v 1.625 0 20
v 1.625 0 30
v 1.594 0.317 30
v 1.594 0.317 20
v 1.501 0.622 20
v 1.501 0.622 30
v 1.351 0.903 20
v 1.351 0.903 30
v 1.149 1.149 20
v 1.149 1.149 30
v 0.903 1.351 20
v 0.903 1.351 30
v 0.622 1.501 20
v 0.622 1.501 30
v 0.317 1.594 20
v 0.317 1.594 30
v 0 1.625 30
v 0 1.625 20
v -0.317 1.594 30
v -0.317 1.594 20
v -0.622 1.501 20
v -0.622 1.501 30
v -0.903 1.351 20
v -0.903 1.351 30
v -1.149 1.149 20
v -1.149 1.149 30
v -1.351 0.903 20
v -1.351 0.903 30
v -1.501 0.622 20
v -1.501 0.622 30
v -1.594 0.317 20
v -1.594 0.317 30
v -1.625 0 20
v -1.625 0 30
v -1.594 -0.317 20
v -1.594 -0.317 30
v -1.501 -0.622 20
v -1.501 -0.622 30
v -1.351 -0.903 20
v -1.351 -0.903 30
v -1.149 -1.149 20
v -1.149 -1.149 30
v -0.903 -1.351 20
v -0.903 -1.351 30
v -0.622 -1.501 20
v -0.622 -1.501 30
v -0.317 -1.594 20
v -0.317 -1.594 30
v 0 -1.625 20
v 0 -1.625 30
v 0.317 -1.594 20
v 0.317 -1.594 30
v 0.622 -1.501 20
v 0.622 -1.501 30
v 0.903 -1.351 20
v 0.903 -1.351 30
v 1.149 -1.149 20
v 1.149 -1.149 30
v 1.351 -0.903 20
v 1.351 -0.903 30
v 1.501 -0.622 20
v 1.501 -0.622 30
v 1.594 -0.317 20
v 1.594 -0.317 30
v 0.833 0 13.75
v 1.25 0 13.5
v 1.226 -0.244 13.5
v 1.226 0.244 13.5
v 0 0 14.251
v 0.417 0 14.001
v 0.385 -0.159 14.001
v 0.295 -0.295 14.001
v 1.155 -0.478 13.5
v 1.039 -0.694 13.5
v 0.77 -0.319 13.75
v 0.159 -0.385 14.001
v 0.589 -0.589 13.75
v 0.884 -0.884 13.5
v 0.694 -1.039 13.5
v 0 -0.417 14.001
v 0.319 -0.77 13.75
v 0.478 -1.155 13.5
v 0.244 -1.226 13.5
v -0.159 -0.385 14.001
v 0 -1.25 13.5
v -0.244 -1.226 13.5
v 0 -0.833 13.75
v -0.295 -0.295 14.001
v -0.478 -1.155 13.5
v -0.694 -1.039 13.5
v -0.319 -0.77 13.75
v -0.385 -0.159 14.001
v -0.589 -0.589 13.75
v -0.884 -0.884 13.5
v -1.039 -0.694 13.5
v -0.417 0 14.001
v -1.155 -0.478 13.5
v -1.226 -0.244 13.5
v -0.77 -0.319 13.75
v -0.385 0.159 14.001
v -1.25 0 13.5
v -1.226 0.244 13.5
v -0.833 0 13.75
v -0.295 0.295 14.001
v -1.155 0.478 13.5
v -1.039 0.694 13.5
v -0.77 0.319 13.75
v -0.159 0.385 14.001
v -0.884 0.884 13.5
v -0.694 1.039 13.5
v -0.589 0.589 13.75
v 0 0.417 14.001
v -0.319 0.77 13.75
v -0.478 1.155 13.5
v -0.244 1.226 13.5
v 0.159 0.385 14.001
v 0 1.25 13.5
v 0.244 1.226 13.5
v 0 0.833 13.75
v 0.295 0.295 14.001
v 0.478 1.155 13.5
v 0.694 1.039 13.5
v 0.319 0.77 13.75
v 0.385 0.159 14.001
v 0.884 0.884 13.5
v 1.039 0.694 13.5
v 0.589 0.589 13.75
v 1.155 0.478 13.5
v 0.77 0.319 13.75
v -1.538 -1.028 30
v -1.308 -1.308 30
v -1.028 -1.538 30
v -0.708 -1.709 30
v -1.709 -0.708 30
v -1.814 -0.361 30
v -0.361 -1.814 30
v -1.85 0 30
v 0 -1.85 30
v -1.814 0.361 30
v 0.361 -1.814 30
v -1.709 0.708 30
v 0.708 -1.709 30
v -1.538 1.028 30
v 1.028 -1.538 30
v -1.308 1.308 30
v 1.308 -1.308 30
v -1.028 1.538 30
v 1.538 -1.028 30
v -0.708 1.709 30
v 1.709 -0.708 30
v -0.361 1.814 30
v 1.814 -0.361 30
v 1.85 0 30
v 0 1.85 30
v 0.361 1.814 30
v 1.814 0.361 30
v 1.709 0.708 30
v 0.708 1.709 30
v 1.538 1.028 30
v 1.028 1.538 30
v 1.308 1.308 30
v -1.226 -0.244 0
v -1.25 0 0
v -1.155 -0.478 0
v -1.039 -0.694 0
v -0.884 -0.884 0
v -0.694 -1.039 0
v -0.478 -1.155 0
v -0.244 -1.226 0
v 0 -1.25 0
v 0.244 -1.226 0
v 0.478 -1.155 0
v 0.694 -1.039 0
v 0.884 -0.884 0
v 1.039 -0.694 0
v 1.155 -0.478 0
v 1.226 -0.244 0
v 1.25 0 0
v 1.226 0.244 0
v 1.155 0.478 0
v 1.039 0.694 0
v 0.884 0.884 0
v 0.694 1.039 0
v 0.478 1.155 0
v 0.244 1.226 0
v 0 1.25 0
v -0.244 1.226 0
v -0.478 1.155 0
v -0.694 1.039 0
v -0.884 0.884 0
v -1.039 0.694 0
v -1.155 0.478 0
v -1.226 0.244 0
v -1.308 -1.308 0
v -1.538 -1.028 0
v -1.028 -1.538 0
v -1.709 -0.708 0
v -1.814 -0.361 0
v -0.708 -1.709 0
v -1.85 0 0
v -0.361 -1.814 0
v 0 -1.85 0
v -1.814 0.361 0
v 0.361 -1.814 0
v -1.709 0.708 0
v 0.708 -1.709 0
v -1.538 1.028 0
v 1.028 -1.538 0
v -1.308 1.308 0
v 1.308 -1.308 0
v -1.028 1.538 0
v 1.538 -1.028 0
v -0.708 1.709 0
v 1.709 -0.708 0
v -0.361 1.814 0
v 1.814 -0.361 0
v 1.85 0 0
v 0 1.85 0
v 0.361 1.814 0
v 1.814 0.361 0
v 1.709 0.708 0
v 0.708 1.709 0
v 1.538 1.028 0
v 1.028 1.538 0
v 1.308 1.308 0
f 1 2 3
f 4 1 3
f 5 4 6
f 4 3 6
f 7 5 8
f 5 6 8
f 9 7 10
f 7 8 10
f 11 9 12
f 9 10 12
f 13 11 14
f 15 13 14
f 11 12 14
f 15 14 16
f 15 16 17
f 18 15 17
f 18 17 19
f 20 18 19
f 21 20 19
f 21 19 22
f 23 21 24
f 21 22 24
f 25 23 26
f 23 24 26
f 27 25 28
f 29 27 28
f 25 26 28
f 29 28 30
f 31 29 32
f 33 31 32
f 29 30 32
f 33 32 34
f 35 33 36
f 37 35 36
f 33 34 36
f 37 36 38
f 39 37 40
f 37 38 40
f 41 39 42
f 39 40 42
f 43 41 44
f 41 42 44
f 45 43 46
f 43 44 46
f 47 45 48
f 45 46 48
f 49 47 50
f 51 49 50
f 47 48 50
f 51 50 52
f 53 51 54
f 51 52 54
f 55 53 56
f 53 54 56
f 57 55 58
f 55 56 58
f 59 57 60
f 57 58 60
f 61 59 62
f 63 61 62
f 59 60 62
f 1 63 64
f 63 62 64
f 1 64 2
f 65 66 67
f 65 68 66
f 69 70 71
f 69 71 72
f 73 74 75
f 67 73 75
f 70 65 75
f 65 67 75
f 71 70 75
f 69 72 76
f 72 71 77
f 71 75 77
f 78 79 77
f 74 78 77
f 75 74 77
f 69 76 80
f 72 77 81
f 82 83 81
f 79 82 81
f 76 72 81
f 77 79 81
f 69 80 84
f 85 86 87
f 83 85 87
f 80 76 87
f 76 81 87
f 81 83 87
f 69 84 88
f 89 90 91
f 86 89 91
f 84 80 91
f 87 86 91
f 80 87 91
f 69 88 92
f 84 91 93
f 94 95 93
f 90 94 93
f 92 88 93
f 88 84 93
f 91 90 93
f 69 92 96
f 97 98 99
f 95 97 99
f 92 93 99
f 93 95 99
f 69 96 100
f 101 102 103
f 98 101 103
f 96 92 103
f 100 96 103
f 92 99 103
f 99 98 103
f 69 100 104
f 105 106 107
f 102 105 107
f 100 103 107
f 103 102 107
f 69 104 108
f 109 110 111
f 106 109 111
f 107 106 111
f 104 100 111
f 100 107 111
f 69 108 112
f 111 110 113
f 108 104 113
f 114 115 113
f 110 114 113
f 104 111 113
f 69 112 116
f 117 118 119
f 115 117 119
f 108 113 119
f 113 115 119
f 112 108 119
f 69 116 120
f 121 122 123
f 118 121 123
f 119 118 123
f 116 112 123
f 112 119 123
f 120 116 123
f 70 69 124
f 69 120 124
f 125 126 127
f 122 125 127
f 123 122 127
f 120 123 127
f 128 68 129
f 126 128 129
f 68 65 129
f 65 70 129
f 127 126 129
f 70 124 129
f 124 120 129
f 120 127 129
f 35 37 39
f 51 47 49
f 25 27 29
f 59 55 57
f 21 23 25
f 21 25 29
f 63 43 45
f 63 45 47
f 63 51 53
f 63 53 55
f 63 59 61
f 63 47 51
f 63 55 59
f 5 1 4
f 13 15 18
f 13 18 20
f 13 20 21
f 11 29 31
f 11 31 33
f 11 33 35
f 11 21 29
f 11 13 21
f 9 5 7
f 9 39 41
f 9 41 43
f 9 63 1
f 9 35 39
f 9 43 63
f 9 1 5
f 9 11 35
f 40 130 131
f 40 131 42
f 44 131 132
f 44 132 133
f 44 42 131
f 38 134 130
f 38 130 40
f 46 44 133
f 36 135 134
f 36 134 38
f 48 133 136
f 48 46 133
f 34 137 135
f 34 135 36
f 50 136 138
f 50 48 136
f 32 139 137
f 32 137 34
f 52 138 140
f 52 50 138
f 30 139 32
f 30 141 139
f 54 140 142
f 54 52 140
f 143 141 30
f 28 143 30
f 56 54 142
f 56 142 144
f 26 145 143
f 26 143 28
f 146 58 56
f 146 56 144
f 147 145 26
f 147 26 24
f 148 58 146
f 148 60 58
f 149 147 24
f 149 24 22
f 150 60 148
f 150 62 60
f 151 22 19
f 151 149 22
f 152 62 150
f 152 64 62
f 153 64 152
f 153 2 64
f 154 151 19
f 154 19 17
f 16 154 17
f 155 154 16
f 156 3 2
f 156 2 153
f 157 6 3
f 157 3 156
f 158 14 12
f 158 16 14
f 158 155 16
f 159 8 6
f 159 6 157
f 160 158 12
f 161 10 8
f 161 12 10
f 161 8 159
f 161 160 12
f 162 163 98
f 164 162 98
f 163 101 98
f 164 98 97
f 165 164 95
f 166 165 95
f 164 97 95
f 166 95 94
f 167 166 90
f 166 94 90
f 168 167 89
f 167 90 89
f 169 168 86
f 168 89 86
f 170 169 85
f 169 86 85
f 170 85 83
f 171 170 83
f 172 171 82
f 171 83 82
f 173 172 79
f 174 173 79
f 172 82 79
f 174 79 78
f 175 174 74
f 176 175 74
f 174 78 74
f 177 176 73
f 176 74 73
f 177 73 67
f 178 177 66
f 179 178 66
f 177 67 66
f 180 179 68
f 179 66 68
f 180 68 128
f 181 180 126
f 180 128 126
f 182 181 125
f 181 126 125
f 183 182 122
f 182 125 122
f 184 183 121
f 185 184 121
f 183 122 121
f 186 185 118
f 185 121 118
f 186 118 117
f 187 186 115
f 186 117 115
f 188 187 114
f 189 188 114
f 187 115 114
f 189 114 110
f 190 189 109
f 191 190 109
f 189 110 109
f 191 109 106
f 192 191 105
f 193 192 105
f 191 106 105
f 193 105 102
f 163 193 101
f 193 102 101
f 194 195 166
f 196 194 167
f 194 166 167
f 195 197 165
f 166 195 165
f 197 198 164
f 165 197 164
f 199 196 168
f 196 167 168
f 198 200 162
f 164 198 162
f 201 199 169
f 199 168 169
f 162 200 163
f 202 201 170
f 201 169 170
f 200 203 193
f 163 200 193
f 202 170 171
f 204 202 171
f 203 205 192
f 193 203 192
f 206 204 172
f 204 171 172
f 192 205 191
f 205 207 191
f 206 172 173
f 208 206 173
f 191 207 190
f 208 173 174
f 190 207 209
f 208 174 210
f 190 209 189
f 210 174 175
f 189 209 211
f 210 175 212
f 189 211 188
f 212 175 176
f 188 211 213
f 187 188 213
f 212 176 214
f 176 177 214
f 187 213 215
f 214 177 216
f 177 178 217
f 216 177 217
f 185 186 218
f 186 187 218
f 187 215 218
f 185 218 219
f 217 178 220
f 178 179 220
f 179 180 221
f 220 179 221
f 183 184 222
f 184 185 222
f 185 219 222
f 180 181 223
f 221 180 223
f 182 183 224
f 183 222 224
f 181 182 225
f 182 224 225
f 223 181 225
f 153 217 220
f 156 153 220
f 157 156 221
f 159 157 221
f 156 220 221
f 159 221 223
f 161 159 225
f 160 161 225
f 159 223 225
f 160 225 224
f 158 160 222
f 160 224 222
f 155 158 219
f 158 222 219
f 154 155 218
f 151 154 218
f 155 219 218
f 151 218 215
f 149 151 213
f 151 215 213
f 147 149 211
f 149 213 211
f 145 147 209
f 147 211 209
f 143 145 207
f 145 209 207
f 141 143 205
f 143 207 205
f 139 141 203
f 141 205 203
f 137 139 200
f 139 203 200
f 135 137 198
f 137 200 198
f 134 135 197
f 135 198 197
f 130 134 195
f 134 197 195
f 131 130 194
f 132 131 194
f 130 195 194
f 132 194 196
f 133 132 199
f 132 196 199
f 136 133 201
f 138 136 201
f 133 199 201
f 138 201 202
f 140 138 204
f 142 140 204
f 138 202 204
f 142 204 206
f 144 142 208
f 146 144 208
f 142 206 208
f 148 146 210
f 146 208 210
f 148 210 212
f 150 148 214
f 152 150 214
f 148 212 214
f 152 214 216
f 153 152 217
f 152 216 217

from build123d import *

# Parameters (mm, degrees)
F0_R     = 1.85
F1_DEPTH = 30
F2_R     = 1.625
F3_DEPTH = 10
F5_D     = 2.5
F5_DEPTH = 13.5
F5_TIP   = 0.7510757738


with BuildPart() as f1:
    # F0 (on Top) → F1 (new body)
    with BuildSketch(Plane.XY):
        Circle(F0_R)
    extrude(amount=F1_DEPTH)

    # F2 (on face) → F3 (cut)
    with BuildSketch(Plane.XY.offset(30)):
        Circle(F2_R)
    extrude(amount=-F3_DEPTH, mode=Mode.SUBTRACT)

    # F5
    with Locations(Plane(origin=(0, 0, 0), x_dir=(1, 0, 0), z_dir=(0, 0, -1))):
        with Locations((0, 0)):
            Hole(F5_D / 2, depth=F5_DEPTH)
            with Locations((0, 0, -(F5_DEPTH + F5_TIP / 2))):  # 118° drill point
                Cone(0, F5_D / 2, F5_TIP, mode=Mode.SUBTRACT)


solid = f1.part
